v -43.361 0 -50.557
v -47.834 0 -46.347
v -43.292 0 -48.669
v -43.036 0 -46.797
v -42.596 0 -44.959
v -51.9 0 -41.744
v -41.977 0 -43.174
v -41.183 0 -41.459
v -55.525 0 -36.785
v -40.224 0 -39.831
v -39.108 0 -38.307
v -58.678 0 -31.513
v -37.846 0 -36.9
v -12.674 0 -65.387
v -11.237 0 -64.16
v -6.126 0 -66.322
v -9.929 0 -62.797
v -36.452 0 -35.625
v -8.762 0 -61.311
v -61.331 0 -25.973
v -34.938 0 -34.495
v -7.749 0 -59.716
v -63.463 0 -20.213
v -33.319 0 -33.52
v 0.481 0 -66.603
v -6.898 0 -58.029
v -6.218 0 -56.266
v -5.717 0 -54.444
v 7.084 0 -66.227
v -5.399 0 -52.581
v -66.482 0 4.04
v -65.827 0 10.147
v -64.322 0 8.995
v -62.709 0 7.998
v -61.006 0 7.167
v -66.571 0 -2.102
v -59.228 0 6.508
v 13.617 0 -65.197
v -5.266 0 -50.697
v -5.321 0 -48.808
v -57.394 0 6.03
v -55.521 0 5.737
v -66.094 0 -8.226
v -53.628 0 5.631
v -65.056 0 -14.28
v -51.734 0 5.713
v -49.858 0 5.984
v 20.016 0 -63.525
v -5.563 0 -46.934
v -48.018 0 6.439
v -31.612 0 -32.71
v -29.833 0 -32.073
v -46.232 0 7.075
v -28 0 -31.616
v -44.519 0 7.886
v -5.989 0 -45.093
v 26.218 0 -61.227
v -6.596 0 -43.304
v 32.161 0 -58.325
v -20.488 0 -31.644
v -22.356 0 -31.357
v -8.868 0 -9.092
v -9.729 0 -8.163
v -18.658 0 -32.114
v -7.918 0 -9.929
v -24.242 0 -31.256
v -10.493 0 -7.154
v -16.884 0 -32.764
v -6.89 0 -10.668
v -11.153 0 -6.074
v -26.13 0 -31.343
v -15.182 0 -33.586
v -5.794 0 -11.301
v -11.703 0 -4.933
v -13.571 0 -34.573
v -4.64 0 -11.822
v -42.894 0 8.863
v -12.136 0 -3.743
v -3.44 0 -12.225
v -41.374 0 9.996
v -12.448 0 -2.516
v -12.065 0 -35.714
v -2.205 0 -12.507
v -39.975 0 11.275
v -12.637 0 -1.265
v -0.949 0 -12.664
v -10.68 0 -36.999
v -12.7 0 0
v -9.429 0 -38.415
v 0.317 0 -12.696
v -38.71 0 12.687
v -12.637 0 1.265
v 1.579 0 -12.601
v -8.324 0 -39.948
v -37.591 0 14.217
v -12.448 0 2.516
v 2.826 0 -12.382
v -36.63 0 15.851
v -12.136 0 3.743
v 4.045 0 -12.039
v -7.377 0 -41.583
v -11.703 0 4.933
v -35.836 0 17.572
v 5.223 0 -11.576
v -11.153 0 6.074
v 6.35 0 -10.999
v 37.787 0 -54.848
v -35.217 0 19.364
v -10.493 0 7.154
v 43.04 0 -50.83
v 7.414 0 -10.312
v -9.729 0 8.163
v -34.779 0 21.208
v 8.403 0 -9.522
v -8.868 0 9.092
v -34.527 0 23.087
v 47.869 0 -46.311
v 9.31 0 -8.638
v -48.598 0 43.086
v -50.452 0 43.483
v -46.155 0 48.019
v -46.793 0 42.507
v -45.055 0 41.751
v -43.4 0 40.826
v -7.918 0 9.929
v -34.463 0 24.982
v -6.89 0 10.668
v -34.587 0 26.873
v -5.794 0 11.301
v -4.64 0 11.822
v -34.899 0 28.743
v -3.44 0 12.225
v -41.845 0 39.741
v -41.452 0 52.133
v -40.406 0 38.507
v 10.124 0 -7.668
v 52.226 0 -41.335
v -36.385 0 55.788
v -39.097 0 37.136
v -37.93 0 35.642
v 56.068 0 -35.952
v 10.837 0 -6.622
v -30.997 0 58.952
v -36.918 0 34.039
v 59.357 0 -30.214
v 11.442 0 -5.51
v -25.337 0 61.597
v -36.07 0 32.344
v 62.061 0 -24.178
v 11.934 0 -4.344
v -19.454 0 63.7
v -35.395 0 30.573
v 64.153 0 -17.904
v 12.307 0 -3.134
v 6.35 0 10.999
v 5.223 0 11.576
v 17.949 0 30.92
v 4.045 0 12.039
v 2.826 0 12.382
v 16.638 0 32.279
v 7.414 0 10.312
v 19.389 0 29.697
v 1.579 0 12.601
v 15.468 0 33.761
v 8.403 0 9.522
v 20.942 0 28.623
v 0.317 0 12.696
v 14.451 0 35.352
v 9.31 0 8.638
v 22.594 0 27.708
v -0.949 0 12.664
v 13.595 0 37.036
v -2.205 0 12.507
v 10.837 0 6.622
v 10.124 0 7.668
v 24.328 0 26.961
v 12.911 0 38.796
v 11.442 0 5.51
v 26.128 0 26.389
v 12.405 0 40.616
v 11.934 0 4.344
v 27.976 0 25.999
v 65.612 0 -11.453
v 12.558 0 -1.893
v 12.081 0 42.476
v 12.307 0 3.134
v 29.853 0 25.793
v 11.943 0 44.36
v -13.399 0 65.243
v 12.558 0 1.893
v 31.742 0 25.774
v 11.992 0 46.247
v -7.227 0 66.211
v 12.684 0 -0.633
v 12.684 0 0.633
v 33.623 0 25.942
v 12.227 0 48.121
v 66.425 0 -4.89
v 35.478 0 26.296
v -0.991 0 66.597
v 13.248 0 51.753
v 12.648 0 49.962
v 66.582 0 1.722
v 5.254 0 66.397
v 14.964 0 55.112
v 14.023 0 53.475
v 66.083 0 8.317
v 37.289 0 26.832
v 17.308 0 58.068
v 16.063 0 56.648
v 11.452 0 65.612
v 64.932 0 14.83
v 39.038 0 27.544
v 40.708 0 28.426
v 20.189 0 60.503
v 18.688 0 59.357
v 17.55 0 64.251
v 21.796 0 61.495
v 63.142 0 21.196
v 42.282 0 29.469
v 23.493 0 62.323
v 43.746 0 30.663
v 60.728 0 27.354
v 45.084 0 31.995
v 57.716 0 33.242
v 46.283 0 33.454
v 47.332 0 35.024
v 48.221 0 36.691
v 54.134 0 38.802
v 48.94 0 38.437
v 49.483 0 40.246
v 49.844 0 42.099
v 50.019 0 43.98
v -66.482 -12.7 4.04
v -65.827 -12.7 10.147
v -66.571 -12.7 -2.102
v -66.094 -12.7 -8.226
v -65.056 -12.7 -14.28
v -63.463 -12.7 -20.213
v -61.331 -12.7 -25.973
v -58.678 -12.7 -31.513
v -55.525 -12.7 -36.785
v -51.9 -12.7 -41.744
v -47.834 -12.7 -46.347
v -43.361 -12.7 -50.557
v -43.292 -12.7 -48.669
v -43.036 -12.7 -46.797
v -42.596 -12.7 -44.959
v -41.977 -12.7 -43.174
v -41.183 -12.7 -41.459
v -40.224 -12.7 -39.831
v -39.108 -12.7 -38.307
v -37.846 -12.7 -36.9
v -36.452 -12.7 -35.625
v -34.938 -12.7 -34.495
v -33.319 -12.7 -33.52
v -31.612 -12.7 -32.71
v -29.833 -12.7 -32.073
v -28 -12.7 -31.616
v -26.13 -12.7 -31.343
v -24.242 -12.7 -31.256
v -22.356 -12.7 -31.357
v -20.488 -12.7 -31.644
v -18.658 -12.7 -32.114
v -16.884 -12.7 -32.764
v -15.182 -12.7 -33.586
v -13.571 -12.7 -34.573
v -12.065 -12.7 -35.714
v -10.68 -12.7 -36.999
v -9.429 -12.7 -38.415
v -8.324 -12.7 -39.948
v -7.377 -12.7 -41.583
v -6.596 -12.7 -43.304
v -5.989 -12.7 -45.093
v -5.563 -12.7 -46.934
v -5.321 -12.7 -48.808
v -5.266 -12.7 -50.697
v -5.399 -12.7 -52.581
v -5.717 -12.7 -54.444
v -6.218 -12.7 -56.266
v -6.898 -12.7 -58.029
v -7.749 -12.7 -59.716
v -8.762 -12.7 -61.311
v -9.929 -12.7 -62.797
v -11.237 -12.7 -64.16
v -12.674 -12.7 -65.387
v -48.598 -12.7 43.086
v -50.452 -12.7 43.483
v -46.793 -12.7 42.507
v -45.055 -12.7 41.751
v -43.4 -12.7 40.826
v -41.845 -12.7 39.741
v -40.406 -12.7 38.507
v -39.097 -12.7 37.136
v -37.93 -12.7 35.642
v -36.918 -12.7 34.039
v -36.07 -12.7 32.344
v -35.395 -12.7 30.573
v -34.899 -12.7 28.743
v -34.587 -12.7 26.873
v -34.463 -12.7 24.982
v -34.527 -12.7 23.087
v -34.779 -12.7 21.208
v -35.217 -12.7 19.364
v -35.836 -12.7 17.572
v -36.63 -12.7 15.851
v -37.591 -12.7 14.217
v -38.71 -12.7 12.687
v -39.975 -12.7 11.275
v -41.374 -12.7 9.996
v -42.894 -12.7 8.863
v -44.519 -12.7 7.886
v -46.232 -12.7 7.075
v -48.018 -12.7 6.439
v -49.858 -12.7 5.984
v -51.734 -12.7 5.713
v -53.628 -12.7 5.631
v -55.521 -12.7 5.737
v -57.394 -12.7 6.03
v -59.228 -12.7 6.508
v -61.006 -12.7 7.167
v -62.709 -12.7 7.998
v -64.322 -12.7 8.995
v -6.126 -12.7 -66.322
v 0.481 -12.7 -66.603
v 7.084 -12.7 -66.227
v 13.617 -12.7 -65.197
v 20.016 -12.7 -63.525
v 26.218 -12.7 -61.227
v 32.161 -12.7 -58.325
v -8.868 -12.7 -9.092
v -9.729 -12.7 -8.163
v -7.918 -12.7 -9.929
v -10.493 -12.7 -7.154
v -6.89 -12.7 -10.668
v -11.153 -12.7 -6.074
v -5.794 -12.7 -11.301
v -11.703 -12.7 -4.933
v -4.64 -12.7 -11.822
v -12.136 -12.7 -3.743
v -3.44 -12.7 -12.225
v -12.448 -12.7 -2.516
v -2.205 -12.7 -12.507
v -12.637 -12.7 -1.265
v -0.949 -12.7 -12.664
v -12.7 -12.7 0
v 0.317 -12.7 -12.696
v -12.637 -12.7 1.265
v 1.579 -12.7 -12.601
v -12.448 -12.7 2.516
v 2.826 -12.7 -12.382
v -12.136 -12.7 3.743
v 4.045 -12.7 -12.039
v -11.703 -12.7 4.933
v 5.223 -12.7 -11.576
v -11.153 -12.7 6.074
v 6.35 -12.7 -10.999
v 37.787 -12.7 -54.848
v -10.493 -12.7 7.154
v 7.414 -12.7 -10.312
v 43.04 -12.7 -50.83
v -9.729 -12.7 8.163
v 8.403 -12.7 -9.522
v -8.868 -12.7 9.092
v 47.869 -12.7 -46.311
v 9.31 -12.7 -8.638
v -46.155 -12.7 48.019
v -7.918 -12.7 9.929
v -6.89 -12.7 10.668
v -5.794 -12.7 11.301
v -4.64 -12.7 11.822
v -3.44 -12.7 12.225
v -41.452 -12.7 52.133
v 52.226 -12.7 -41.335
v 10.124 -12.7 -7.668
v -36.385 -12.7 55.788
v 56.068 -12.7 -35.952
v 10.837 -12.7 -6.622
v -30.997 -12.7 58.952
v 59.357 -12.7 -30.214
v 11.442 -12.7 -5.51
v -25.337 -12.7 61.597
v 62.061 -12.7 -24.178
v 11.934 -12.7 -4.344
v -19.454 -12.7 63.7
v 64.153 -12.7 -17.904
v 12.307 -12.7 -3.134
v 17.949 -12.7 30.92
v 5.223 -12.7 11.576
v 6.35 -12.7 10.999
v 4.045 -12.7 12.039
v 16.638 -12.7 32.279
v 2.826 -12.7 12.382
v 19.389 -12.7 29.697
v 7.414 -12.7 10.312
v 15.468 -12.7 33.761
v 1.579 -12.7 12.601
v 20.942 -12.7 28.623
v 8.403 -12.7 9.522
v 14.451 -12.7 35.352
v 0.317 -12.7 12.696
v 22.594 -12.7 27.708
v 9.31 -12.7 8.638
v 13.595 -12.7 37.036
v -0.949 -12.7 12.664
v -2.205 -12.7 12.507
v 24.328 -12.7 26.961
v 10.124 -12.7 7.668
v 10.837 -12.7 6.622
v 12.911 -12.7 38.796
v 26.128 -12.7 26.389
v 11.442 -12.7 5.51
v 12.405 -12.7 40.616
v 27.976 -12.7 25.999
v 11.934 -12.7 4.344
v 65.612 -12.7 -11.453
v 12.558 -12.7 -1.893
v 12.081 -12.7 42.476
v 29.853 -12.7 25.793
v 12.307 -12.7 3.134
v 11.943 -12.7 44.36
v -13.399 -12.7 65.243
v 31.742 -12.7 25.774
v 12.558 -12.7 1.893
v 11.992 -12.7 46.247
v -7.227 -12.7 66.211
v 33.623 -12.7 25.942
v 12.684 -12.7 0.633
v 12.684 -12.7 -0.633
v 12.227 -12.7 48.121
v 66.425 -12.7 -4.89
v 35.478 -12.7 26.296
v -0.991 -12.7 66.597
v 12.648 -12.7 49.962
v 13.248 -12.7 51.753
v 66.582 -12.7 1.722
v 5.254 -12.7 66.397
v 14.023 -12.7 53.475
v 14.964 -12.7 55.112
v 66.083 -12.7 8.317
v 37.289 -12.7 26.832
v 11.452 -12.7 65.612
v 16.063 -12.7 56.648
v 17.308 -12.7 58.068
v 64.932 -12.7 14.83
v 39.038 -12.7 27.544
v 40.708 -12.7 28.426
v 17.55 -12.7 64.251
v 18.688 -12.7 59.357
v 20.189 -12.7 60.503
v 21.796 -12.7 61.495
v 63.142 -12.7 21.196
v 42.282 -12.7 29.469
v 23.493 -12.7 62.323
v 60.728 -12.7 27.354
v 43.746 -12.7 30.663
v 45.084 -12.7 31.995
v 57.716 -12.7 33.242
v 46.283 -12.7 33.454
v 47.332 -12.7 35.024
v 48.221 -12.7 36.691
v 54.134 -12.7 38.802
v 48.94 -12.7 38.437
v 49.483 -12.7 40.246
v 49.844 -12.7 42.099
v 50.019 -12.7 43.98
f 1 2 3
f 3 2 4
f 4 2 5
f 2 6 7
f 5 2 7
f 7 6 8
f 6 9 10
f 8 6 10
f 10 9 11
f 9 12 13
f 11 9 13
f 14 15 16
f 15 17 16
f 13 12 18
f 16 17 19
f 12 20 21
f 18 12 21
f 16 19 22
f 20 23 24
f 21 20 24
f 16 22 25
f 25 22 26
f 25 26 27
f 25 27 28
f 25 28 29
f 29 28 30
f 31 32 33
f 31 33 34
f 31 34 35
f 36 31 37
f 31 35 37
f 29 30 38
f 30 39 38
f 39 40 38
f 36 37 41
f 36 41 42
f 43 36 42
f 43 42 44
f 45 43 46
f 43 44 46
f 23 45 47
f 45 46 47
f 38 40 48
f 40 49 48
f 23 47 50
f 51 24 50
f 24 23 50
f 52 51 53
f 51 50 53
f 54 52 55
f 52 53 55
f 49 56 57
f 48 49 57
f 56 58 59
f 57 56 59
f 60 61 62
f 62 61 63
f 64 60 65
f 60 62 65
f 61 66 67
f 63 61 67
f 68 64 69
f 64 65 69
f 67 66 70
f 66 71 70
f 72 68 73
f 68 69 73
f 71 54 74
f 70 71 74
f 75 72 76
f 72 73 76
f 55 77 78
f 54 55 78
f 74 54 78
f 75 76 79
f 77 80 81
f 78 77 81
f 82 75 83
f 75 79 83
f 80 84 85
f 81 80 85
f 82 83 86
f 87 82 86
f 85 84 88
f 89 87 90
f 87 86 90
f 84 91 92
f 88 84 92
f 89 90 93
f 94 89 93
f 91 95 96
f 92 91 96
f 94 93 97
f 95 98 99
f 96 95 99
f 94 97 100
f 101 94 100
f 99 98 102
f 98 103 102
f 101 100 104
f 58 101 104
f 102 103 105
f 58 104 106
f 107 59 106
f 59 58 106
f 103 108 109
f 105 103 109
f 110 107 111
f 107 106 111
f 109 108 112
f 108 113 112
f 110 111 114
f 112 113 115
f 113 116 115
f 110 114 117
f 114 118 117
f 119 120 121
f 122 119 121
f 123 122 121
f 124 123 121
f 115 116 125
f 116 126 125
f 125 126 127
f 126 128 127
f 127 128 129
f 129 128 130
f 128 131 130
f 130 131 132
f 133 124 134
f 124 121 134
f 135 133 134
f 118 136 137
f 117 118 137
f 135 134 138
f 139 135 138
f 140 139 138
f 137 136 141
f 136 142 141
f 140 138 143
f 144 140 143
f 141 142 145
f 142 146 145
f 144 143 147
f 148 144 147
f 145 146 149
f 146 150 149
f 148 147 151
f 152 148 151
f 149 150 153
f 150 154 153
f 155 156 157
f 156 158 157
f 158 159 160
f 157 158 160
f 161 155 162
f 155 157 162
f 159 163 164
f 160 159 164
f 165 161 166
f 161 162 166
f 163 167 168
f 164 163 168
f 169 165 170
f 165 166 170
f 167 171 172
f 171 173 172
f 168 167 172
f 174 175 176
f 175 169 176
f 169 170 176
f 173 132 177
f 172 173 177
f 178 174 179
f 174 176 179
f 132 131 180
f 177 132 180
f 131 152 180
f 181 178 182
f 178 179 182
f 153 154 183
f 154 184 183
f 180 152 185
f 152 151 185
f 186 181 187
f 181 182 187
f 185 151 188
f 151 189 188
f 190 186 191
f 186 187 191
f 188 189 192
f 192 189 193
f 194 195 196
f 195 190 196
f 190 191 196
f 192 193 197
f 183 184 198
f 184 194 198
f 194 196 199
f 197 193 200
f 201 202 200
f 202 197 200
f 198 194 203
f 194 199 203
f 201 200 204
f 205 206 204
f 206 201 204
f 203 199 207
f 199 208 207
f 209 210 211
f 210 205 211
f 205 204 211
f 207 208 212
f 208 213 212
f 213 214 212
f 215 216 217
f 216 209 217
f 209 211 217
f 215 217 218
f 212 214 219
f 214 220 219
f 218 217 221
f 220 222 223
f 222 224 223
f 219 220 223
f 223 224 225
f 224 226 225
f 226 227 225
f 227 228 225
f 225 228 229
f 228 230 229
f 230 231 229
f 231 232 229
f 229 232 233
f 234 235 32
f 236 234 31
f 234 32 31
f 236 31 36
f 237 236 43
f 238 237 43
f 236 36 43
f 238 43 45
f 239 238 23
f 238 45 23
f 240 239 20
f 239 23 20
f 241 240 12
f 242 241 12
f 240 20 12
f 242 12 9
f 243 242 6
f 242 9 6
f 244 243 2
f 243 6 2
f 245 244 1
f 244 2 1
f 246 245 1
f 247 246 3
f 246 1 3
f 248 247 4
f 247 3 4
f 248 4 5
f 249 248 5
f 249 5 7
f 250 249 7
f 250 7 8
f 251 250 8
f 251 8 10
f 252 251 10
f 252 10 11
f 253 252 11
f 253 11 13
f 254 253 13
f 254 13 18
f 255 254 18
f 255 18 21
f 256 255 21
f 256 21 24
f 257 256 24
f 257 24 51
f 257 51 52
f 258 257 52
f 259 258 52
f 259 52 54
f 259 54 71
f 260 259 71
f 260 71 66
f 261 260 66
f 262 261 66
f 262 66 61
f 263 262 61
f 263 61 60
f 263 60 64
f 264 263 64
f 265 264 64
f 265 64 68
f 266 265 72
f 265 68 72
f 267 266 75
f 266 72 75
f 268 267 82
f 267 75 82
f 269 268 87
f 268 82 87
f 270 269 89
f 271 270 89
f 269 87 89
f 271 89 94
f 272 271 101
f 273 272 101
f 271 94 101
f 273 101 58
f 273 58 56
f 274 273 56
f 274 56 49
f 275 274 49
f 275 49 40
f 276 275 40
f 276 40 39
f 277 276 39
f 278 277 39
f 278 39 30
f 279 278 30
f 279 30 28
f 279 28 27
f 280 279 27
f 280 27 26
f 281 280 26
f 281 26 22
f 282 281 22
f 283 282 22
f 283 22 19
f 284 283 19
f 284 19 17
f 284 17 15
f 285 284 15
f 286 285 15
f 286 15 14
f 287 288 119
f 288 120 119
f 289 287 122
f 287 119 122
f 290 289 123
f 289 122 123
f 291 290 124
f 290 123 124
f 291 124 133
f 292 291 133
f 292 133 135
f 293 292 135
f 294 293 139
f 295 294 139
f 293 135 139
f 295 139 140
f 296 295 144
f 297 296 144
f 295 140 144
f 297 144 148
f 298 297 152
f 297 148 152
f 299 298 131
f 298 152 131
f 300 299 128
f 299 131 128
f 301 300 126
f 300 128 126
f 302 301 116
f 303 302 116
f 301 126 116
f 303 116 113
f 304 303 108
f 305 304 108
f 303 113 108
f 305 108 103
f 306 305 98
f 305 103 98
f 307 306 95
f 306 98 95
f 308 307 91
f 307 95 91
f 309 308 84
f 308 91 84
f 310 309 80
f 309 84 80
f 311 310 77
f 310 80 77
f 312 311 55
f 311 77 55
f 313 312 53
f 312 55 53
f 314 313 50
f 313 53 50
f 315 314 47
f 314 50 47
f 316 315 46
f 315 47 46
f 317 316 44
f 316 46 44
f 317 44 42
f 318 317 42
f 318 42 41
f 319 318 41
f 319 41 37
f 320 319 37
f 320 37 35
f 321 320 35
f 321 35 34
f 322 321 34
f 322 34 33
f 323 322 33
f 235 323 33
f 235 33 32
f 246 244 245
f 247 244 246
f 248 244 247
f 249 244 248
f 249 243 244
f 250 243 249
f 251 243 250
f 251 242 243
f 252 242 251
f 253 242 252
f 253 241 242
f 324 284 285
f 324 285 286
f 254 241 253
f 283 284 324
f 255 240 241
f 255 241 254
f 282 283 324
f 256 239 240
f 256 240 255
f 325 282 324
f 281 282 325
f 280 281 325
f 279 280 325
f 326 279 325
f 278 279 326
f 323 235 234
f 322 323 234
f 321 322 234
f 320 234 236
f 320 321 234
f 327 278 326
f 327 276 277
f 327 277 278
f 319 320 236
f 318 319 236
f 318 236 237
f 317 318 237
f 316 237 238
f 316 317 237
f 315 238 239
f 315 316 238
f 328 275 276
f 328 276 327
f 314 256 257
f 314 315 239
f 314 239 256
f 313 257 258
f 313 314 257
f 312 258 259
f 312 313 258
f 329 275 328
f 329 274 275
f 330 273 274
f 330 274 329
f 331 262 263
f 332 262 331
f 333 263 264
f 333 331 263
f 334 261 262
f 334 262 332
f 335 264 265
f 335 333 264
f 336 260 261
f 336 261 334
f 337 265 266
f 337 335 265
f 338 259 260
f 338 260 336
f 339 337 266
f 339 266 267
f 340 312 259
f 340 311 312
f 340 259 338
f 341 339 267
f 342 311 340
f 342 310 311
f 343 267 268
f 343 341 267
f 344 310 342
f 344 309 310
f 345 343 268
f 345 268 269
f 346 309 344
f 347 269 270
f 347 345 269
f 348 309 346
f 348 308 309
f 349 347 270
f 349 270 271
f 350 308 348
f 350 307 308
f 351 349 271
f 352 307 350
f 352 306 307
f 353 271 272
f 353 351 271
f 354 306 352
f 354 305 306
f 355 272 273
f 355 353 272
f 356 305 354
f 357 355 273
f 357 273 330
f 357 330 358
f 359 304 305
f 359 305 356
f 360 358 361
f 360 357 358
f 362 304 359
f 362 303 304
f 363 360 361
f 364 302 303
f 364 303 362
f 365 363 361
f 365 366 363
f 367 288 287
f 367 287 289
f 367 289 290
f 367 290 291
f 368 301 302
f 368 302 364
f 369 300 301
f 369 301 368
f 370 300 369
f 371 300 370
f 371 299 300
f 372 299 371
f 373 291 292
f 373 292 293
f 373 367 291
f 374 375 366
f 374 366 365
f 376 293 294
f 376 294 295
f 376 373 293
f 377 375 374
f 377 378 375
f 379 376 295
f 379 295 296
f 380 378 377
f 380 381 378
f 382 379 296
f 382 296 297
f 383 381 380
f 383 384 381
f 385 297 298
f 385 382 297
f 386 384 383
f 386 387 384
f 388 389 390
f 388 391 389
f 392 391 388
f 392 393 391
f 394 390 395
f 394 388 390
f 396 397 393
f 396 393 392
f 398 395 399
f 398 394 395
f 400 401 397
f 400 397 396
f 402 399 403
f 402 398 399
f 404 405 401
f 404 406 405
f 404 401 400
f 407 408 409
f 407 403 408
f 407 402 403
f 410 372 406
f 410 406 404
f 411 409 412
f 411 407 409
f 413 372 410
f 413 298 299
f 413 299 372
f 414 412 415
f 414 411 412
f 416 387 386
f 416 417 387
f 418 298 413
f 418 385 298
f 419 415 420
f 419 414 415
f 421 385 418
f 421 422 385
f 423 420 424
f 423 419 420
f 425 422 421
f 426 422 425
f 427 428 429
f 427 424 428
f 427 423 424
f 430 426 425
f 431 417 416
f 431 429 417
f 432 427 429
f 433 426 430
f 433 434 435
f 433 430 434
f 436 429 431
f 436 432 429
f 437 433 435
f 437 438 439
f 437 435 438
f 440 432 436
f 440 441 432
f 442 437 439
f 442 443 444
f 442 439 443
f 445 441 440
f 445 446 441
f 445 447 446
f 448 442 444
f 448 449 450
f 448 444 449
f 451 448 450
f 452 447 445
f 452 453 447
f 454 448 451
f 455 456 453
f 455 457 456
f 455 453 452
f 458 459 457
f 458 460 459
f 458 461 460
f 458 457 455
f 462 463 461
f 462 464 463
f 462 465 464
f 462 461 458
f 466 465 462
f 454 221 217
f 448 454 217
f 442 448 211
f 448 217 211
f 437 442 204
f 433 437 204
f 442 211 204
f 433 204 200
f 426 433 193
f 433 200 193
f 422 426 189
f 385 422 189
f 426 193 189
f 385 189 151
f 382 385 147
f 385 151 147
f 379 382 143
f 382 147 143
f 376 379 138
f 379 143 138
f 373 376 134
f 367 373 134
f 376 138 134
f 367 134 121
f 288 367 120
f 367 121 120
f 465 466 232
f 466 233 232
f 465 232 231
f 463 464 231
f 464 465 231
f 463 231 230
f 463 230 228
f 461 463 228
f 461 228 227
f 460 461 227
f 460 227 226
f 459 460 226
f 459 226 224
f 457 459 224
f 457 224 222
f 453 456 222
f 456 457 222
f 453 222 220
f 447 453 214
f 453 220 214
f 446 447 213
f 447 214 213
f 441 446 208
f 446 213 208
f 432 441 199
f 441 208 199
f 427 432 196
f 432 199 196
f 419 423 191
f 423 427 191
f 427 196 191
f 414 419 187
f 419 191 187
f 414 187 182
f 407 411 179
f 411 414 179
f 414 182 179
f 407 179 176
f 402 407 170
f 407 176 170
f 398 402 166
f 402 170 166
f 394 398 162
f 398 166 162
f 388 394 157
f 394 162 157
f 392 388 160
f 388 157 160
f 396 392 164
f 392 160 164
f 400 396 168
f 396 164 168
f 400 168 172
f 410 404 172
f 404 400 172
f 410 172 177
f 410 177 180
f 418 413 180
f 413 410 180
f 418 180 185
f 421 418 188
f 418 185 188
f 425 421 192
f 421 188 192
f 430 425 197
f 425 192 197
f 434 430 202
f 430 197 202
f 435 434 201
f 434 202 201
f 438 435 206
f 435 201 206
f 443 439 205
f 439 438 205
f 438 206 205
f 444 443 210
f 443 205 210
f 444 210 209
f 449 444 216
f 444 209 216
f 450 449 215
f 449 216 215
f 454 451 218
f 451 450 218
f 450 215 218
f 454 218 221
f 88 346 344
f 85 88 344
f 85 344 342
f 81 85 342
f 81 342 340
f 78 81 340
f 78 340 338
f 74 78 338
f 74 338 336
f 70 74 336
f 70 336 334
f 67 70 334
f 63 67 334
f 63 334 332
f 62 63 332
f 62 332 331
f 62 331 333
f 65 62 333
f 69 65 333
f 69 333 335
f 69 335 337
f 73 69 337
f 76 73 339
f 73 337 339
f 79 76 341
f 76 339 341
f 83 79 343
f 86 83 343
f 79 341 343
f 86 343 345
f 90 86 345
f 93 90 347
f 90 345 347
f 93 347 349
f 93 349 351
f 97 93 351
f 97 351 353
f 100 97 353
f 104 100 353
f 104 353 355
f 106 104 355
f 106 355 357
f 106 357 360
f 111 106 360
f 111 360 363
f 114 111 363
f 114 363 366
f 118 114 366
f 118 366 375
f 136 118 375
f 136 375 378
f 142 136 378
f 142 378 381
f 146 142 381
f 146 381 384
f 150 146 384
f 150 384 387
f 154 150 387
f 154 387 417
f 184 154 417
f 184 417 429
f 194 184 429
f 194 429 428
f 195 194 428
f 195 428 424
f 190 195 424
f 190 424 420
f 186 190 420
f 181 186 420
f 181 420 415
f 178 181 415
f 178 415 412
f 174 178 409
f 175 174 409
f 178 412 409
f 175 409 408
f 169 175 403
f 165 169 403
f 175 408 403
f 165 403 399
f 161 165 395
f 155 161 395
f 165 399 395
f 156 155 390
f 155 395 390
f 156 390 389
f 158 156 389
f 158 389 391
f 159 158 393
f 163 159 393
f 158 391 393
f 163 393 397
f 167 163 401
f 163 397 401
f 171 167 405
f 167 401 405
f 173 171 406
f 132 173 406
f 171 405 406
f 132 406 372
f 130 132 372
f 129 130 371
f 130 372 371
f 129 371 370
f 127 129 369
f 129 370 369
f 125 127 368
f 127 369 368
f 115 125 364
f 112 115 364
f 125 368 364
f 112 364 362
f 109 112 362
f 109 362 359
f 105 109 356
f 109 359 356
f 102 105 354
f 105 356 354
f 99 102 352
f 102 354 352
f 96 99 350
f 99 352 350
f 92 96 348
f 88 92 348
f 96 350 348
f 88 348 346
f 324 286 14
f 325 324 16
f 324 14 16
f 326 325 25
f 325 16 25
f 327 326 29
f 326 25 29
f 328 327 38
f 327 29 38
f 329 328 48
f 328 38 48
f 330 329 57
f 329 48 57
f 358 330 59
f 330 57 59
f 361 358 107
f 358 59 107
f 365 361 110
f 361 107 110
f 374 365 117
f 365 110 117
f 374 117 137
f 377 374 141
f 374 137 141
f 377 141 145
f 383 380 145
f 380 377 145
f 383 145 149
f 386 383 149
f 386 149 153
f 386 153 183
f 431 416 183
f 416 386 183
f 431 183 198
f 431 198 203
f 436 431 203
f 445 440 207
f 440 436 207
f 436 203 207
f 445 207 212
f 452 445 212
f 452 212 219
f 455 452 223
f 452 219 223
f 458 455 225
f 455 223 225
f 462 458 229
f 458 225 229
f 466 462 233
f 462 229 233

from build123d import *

# Parameters (mm, degrees)
F0_R     = 66.604368
F1_DEPTH = 12.7
F3_D     = 25.4
F4_D     = 38.1


with BuildPart() as f1:
    # F0 (on Front) → F1 (new body)
    with BuildSketch(Plane.XZ):
        Circle(F0_R)
    extrude(amount=F1_DEPTH)

    # F3 (through all)
    with Locations(Plane(origin=(0, 0, 0), x_dir=(1, 0, 0), z_dir=(0, 1, 0))):
        with Locations((0, 0)):
            Hole(F3_D / 2)

    # F4 (through all)
    with Locations(Plane.XZ.offset(12.7)):
        with Locations((-53.510338, 24.680197), (30.987347, 44.80923), (-24.312185, -50.30597)):
            Hole(F4_D / 2)


solid = f1.part
